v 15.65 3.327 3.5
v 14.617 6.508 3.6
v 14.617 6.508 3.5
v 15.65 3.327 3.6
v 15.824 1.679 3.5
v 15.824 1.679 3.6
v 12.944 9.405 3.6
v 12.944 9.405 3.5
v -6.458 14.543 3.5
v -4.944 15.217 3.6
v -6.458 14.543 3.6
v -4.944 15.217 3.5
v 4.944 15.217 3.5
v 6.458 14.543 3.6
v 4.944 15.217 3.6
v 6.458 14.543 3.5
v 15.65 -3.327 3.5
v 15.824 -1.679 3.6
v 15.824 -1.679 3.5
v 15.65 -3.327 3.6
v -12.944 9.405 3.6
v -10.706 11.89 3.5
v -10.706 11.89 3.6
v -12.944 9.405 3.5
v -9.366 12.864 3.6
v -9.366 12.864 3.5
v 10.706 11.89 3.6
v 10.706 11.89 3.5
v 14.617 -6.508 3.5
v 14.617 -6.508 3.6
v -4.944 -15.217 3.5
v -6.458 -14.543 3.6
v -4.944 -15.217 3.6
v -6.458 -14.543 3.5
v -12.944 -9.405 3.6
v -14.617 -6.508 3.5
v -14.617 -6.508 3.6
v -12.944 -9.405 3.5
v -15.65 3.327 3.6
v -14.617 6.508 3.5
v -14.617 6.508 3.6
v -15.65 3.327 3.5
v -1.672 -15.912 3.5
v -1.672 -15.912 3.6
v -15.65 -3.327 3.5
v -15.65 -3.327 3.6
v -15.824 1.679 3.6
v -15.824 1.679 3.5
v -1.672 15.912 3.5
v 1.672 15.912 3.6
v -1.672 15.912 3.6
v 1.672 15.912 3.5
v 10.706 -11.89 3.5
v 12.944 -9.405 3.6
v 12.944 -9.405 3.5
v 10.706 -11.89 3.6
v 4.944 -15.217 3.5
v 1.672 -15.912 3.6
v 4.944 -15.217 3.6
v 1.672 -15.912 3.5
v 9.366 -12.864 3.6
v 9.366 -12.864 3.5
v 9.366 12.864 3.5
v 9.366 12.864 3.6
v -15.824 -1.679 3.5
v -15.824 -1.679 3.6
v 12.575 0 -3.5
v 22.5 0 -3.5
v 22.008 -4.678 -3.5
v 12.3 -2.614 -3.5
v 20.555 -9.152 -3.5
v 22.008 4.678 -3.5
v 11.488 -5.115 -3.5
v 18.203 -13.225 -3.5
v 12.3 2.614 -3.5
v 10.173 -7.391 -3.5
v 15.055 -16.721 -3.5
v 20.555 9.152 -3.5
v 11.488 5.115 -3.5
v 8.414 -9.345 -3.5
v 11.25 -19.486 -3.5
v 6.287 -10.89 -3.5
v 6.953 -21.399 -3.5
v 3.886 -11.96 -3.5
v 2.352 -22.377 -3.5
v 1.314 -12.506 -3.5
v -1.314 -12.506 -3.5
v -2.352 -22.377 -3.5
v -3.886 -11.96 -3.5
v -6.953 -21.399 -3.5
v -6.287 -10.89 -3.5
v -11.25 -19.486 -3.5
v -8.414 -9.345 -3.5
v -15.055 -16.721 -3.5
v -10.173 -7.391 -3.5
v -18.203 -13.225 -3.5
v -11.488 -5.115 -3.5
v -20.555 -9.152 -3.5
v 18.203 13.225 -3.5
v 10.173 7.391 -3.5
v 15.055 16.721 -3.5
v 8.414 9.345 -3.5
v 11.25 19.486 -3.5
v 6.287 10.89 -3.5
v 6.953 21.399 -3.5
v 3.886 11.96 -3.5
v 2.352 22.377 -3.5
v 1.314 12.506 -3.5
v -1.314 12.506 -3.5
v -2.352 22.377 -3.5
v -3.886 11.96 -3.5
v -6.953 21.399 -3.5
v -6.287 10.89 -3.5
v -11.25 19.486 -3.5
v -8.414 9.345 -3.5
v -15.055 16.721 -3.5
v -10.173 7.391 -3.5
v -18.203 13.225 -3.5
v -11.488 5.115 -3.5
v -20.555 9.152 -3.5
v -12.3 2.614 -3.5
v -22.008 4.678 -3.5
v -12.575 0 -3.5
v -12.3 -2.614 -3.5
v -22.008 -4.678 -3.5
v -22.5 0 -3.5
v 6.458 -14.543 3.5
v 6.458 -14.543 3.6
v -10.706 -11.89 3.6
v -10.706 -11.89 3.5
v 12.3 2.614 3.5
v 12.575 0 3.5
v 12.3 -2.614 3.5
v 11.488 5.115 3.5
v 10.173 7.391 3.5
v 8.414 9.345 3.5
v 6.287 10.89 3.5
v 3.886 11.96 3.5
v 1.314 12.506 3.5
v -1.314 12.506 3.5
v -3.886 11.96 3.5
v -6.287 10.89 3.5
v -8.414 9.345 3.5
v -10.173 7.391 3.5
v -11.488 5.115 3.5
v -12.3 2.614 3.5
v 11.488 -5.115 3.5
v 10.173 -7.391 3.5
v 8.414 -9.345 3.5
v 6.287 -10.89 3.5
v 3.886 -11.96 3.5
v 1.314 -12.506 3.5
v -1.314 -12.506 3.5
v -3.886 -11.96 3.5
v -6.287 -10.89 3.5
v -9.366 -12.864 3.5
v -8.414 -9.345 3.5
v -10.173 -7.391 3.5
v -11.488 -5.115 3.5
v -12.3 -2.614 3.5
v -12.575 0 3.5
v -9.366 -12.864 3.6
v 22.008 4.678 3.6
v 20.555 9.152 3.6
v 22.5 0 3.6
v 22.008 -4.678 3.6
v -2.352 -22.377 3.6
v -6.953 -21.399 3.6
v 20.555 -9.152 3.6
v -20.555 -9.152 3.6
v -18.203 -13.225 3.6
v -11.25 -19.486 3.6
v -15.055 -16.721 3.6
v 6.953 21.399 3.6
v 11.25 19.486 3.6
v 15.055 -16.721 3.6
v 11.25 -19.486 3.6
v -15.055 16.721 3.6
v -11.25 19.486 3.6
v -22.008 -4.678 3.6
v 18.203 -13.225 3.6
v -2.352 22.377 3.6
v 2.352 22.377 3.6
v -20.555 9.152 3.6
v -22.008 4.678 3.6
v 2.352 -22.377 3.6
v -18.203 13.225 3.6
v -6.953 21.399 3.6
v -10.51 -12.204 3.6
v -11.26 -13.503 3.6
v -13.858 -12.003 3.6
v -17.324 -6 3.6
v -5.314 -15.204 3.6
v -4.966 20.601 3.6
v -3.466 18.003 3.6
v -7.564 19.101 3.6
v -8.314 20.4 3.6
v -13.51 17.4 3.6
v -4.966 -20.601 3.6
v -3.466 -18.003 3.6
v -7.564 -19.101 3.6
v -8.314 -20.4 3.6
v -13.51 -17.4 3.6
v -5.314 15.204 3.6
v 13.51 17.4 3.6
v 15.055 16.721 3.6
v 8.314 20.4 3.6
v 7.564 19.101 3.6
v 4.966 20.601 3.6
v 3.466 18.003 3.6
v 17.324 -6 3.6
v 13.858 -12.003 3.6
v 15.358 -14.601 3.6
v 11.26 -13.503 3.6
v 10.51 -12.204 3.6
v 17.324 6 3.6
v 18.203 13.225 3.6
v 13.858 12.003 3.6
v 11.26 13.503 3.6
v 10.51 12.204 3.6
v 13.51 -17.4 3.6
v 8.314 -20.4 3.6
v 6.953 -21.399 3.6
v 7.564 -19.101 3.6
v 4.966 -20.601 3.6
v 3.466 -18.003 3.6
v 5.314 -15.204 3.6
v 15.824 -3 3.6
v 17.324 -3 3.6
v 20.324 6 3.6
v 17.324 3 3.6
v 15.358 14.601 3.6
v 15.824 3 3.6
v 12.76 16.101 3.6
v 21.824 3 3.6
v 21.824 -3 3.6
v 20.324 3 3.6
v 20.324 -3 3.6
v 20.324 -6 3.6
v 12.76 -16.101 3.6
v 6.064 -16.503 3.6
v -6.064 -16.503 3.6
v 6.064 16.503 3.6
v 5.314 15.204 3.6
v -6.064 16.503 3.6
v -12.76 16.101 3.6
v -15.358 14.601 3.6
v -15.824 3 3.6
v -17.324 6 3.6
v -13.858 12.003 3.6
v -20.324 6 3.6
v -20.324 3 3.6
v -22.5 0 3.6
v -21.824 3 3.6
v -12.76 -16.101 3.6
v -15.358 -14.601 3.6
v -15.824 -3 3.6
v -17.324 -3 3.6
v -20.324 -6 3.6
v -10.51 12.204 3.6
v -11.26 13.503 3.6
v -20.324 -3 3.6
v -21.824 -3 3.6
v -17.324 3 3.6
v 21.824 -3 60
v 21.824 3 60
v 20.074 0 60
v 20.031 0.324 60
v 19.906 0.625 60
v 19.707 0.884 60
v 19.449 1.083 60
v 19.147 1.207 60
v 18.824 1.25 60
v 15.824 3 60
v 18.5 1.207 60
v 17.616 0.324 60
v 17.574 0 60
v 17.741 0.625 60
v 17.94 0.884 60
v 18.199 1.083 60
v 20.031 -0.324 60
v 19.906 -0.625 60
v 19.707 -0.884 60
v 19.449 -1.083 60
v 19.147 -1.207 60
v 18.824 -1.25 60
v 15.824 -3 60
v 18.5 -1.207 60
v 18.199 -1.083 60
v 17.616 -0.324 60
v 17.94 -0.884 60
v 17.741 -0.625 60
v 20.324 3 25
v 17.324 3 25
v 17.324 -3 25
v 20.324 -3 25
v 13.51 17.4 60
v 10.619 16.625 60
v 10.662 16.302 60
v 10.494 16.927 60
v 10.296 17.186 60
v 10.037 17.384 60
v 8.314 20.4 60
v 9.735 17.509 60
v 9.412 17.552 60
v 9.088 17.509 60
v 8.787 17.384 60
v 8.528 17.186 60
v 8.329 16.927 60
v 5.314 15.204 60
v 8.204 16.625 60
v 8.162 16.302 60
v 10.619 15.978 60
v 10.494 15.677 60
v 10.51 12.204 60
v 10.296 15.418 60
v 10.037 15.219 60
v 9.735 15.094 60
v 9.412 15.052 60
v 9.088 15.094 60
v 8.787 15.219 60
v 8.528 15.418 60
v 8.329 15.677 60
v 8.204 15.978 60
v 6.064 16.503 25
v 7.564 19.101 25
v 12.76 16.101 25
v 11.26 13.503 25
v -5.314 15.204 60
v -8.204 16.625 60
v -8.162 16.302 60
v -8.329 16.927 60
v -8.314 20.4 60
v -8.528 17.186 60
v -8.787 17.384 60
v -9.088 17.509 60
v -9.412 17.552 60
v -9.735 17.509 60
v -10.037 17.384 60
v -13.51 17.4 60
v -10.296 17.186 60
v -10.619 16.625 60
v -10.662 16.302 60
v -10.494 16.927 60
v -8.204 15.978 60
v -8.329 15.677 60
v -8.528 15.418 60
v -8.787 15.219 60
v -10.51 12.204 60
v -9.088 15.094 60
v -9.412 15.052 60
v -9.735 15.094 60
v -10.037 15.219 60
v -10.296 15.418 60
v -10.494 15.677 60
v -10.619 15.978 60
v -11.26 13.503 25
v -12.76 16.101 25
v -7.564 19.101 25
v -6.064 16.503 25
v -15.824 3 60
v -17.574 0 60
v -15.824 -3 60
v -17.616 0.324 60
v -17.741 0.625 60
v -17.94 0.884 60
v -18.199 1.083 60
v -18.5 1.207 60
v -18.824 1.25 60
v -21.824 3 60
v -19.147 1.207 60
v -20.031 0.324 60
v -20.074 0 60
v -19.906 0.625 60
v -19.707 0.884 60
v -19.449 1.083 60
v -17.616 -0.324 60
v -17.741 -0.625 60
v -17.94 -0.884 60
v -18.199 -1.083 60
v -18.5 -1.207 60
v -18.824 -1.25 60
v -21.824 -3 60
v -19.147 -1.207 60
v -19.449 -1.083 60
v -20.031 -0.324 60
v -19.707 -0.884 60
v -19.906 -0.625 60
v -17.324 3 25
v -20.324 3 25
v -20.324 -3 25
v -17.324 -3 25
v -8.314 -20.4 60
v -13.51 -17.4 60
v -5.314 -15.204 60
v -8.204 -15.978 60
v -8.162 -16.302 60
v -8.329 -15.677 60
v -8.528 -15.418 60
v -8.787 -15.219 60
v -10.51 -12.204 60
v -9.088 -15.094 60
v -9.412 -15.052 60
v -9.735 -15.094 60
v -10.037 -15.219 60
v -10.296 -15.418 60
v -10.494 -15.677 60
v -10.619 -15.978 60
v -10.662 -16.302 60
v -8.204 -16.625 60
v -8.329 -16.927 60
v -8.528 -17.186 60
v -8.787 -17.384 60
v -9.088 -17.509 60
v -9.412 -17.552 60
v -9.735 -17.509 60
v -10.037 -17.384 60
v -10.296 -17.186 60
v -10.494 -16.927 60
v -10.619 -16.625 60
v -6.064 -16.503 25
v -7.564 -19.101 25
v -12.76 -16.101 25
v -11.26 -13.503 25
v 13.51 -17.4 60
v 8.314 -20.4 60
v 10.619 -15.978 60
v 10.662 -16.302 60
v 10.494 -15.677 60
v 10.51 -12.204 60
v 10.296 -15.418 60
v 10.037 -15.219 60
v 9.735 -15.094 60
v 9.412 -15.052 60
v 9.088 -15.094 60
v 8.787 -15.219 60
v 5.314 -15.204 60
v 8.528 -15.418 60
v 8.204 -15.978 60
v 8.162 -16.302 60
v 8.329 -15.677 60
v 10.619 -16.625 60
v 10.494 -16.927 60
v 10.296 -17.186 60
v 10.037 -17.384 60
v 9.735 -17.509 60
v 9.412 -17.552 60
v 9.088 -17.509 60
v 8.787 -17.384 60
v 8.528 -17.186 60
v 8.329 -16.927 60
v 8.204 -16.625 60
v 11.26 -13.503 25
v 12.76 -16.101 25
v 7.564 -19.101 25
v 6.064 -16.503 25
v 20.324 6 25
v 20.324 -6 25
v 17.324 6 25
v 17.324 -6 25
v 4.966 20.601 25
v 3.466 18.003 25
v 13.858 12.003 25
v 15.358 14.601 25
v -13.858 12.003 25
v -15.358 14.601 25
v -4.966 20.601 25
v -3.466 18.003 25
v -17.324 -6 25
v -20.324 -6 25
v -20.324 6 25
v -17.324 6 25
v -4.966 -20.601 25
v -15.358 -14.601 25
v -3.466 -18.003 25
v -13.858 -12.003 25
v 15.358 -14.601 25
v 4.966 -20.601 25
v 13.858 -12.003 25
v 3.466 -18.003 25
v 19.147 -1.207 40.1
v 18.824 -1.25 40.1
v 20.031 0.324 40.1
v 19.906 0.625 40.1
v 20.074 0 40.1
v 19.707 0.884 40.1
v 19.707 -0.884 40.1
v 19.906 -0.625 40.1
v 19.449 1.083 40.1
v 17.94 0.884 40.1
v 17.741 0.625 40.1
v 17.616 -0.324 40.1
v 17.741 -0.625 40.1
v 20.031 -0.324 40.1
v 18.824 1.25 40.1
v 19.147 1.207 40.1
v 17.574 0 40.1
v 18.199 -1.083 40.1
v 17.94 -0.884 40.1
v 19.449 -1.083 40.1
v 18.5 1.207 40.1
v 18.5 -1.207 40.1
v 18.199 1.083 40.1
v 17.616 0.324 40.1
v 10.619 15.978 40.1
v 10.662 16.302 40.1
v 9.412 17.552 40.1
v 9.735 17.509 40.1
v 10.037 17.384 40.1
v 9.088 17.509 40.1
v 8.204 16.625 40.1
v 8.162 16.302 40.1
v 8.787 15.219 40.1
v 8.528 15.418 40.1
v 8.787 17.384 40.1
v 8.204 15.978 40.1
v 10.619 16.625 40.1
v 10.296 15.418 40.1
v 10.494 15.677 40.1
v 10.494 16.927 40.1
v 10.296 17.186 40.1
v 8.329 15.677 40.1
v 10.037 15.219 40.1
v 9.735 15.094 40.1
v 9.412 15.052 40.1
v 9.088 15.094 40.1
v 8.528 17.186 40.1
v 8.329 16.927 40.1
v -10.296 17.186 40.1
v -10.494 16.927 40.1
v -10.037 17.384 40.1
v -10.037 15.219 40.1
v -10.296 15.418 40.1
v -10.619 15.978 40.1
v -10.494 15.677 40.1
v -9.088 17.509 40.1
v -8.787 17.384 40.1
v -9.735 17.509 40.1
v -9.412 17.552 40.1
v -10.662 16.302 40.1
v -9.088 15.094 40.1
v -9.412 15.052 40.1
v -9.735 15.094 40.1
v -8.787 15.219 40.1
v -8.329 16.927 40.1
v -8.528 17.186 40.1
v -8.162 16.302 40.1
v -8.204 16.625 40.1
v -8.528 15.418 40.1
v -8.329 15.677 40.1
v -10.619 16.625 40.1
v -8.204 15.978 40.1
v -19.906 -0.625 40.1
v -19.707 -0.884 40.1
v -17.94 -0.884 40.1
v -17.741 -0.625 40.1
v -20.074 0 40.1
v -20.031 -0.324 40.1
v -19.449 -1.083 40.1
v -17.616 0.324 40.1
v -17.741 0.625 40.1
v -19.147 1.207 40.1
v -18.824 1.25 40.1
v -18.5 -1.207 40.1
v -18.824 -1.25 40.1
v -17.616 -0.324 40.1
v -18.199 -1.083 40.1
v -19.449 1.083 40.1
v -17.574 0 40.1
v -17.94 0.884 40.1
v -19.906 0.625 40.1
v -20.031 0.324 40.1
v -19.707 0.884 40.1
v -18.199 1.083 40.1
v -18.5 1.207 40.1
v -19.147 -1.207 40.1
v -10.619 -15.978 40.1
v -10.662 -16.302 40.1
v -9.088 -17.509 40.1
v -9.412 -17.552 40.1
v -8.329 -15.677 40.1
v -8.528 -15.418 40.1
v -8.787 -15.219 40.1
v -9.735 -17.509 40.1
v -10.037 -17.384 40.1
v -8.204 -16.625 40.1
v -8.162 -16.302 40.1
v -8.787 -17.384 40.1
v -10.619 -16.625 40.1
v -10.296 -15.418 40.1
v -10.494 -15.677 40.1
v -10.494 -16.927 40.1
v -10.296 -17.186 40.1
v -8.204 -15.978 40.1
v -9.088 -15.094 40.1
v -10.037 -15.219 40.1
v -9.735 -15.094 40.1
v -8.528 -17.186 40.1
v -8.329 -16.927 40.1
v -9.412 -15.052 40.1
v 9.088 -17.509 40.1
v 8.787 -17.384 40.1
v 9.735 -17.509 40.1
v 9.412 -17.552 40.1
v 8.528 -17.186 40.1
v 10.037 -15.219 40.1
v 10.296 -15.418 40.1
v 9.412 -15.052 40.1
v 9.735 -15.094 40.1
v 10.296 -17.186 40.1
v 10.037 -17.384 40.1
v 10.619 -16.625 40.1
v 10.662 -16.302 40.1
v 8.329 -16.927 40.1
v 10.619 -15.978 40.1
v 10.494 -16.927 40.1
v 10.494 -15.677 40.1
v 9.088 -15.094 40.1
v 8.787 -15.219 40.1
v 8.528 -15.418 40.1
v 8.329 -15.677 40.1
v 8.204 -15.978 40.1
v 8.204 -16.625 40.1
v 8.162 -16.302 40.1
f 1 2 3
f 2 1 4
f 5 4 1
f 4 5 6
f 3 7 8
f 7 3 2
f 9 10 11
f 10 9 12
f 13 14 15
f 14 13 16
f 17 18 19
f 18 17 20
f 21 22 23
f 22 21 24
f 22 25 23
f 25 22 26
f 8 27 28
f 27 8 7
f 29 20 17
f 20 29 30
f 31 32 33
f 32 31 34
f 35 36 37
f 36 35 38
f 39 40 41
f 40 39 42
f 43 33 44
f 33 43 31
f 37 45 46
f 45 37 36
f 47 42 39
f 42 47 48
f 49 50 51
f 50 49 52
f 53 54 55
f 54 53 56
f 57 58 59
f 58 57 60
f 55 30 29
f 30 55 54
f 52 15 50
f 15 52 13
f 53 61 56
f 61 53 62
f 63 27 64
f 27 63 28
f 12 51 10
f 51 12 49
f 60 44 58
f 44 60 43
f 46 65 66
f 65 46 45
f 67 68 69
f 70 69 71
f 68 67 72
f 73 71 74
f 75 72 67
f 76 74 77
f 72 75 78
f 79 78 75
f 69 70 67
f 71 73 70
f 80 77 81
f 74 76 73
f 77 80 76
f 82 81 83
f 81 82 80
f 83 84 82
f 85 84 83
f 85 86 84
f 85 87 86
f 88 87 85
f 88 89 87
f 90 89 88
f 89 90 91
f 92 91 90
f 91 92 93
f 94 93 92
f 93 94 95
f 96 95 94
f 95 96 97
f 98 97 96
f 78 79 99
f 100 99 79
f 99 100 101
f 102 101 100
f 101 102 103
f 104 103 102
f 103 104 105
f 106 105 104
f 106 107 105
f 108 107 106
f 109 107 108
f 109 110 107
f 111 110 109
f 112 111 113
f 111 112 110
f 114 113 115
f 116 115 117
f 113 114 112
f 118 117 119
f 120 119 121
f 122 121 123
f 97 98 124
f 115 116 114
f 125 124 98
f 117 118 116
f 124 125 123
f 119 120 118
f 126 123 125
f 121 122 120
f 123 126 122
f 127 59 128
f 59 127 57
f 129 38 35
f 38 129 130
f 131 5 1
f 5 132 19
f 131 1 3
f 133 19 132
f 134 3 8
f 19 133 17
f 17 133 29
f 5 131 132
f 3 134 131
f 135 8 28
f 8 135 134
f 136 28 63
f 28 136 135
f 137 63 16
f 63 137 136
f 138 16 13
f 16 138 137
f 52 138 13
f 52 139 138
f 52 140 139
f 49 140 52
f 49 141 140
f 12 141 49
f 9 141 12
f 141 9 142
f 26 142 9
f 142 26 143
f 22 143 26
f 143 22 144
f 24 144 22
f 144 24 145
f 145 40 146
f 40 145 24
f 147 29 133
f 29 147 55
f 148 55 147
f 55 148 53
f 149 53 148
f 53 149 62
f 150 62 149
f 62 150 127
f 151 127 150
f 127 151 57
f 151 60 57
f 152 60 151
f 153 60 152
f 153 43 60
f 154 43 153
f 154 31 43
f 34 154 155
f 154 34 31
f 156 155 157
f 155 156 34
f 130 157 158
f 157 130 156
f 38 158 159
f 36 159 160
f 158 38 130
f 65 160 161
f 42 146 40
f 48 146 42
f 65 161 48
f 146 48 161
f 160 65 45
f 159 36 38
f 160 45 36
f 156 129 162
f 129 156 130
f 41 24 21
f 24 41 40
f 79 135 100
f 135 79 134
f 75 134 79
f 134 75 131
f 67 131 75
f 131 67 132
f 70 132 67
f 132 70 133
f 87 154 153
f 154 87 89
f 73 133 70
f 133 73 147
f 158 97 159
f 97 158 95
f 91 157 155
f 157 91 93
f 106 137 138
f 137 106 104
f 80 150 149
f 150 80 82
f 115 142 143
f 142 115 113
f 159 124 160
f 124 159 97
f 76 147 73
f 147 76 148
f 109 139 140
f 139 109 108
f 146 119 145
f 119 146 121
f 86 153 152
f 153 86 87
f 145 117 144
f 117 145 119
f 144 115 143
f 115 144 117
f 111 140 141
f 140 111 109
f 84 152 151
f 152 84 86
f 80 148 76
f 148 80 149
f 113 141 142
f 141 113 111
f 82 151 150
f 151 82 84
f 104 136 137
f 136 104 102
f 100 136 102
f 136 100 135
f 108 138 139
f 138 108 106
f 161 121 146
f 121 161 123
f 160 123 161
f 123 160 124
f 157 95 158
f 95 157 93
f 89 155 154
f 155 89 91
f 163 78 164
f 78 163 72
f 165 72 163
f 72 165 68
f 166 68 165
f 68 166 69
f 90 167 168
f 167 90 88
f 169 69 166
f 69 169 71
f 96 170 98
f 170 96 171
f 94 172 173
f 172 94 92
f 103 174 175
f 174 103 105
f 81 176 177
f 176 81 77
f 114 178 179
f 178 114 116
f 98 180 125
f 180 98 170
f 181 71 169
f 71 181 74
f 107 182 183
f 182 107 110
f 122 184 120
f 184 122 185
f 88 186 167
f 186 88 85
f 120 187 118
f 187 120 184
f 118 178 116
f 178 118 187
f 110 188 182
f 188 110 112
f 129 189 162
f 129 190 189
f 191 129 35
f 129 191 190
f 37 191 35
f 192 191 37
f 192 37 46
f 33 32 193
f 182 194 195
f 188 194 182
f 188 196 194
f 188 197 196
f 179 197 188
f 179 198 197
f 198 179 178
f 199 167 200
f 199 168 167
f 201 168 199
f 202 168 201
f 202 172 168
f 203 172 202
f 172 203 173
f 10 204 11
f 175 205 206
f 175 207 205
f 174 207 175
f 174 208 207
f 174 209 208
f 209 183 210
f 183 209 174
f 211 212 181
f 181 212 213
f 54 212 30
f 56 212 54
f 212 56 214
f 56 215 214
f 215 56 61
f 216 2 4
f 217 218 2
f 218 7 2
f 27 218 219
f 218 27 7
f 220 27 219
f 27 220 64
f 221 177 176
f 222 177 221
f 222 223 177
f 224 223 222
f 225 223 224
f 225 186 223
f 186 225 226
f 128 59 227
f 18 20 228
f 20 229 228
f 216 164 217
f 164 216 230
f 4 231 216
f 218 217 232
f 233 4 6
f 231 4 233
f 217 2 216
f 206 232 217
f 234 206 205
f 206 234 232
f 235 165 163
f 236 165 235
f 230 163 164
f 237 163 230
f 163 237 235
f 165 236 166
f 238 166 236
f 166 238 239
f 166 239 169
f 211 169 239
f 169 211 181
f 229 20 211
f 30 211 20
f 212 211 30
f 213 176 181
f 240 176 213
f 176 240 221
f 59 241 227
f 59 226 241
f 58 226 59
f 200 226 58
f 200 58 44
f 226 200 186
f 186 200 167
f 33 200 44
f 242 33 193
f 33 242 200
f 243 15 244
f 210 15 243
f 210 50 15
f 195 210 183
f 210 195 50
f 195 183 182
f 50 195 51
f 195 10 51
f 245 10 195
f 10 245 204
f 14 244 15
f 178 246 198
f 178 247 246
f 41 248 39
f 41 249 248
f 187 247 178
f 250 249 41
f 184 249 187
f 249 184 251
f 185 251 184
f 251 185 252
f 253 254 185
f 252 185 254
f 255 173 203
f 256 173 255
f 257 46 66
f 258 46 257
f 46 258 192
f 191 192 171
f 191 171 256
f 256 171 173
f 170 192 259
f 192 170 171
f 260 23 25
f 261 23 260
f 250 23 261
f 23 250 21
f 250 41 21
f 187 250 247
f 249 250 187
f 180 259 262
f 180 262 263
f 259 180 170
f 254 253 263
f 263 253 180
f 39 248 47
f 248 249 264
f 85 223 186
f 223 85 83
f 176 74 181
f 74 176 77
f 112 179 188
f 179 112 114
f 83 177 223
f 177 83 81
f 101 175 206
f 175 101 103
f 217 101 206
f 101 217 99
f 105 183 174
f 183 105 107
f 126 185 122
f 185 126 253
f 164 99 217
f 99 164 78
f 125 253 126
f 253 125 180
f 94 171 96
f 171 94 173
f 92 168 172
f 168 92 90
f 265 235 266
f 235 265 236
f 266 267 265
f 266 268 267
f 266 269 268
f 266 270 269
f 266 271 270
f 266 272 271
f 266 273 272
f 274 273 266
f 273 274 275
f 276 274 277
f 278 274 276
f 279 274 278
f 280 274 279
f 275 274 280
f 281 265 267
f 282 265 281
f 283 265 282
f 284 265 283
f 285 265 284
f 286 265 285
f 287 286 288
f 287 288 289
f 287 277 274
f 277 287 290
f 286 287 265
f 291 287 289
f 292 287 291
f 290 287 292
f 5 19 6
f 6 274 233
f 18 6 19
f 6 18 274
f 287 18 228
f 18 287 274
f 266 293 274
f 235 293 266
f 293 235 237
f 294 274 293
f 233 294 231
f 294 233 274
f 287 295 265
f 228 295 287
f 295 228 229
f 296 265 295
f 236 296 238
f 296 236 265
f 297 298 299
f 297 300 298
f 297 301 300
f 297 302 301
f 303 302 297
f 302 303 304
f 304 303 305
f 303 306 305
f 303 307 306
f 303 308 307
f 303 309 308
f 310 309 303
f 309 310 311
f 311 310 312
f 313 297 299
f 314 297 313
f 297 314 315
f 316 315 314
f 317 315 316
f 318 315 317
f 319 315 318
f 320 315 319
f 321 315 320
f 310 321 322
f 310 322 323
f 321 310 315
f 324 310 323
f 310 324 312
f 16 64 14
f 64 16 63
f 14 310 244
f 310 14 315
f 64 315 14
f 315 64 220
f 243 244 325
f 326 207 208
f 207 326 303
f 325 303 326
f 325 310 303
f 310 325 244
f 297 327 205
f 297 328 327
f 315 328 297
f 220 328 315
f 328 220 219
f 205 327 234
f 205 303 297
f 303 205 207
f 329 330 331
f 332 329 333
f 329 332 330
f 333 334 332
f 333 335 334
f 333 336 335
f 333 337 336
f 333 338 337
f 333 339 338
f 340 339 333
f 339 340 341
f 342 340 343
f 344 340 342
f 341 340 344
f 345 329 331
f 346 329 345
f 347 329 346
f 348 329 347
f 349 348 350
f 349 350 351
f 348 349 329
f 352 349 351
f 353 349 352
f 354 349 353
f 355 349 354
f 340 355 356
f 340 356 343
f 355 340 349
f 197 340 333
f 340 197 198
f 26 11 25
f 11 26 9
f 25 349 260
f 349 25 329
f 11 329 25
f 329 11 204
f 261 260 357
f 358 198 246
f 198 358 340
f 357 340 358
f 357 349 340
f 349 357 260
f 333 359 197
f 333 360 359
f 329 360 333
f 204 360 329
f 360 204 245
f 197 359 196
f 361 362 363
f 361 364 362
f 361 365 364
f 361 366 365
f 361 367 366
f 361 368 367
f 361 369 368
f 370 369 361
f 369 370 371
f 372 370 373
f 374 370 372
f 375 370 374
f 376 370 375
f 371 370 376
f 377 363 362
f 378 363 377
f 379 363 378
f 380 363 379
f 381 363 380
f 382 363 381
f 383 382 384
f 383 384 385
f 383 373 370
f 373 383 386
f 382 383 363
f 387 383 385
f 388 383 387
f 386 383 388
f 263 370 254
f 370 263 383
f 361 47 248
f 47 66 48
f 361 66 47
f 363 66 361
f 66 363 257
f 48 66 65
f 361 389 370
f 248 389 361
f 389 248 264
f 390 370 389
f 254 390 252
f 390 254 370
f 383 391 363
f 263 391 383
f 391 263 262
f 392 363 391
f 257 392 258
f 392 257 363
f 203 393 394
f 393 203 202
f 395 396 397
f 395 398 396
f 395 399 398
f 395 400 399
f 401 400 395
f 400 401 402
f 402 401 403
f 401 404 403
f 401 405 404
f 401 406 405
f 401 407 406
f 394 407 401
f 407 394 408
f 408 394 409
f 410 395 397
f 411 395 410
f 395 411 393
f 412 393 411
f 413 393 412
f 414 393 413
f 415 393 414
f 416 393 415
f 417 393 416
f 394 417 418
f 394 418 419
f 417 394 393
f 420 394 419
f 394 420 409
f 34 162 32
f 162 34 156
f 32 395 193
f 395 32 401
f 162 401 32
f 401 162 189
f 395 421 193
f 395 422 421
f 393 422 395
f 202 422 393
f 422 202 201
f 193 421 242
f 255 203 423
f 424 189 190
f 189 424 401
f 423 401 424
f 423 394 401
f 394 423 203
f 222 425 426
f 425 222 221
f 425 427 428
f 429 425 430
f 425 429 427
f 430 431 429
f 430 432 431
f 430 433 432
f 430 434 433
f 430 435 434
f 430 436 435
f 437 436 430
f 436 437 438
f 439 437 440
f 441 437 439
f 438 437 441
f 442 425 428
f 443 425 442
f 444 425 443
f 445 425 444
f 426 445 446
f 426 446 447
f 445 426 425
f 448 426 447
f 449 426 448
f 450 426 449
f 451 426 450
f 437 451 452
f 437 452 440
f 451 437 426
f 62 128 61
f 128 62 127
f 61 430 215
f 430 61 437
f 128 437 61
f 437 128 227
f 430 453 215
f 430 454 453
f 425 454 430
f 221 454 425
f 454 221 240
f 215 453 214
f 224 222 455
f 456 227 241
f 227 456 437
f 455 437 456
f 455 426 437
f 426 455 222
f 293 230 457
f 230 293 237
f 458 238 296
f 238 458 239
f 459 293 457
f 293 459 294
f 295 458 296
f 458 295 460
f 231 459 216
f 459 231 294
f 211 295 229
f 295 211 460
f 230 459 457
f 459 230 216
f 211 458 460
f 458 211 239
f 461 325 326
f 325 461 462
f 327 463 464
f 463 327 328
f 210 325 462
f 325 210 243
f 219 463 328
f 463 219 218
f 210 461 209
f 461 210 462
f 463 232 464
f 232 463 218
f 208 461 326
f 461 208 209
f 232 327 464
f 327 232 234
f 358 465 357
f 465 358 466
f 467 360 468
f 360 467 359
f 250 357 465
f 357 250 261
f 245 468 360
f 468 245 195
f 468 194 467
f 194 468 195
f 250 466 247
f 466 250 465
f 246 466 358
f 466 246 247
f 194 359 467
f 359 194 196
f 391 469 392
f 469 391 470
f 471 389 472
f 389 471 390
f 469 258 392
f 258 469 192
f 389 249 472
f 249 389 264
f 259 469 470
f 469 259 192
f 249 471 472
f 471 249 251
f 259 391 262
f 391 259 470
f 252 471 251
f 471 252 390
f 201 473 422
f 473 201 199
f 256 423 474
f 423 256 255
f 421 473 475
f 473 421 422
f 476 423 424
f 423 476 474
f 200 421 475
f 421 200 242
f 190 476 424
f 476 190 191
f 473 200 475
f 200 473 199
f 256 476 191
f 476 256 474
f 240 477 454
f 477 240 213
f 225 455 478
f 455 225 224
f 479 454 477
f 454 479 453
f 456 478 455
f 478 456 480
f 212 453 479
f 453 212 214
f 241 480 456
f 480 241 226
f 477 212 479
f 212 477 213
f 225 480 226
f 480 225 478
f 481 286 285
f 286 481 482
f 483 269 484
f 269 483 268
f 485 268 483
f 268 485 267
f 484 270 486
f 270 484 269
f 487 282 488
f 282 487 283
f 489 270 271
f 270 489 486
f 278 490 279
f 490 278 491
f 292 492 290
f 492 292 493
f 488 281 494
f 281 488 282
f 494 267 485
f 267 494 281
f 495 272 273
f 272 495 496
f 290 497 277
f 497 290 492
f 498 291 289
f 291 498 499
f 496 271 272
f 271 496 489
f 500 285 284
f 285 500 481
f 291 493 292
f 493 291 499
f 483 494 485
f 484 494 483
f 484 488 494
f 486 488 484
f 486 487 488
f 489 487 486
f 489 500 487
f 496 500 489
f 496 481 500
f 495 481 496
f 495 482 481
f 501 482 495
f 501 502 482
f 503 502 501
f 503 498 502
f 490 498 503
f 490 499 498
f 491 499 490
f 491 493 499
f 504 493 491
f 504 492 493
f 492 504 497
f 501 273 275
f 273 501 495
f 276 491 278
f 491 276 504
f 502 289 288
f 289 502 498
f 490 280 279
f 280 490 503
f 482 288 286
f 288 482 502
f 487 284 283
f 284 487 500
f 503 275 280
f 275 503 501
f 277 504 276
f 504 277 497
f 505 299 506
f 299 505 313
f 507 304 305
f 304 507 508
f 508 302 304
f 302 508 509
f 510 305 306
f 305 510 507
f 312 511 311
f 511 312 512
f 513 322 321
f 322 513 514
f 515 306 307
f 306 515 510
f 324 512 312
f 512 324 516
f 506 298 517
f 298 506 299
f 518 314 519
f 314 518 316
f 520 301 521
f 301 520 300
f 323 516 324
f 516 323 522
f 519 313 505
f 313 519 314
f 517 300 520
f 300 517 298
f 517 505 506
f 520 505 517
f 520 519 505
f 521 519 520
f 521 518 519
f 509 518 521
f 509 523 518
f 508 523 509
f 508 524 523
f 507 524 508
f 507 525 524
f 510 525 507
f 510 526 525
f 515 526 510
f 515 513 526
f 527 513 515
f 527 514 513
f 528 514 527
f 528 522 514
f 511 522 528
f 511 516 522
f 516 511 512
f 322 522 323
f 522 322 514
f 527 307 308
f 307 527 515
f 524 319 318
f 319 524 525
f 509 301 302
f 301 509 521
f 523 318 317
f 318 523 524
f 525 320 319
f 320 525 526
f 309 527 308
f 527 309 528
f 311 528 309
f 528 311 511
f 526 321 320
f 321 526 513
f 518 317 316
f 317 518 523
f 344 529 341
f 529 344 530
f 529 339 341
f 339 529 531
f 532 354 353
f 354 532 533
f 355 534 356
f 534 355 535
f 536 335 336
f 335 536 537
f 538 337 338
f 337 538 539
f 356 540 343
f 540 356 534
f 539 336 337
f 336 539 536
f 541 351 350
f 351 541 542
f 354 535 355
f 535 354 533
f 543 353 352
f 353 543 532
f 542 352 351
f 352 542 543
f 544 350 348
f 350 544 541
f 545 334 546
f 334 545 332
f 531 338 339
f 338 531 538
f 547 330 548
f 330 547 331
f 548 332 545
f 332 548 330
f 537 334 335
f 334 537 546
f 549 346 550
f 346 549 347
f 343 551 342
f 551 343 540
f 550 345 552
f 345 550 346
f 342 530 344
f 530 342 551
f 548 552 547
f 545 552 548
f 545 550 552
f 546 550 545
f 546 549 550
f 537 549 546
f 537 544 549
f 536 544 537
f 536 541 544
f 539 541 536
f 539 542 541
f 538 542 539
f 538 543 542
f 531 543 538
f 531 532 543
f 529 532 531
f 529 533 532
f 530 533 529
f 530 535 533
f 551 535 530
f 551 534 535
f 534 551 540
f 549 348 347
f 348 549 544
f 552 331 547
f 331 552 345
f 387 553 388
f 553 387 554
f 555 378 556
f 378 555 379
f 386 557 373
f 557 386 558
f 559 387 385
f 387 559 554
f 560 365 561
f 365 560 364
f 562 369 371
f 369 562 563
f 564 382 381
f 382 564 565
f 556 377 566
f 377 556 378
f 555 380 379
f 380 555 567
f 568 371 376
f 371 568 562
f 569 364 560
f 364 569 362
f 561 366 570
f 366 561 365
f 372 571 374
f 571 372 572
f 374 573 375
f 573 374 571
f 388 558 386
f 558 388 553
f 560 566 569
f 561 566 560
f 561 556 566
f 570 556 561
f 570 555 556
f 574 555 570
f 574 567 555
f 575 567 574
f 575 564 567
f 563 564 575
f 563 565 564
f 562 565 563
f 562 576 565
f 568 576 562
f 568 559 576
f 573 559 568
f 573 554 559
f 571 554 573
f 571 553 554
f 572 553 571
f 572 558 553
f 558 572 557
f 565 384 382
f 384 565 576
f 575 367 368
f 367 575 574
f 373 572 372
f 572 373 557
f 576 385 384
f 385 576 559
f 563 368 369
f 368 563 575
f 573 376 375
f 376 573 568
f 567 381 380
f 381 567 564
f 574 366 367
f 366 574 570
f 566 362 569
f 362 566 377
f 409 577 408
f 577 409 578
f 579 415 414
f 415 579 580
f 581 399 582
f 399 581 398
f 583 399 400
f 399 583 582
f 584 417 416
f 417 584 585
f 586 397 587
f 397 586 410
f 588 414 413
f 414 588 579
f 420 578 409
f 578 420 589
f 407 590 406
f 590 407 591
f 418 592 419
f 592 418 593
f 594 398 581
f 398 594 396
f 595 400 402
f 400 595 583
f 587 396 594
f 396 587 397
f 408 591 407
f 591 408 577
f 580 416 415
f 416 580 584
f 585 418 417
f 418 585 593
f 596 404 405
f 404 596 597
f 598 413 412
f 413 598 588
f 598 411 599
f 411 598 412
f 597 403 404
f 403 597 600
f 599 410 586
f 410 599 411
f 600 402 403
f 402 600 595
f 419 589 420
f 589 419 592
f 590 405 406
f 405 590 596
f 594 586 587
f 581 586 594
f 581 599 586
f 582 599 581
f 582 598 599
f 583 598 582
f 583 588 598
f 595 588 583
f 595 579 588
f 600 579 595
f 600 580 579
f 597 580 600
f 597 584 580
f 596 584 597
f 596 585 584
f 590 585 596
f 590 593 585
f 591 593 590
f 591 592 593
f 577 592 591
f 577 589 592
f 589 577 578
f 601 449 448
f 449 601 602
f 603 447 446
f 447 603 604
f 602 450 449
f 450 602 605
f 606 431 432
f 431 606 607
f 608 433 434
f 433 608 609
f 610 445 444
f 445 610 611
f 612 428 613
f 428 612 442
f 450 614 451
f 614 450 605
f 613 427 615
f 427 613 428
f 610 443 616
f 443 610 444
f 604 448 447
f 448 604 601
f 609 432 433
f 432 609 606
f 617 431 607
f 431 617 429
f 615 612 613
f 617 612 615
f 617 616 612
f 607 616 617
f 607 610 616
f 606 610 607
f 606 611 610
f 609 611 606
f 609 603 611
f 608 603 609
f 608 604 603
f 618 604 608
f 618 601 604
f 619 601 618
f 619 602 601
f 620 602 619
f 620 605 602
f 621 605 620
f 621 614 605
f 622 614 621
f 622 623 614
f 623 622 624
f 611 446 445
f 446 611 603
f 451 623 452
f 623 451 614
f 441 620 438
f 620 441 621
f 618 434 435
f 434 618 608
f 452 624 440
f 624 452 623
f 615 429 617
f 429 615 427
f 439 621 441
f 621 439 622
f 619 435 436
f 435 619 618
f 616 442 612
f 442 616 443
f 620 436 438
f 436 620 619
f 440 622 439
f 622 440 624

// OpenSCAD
// file: 3dprinter.scad
//BioDeploy SCAD file = 3dprinter.scad


//choose the max specs for your 3d printer
//here we use a replicator2x specs

x_print_max = 25*10;
y_print_max = 15.2*10;
z_print_max = 15.5*10;

//don't forget *10 to put in centimeters
// file: generator_variables.scad
//===============================================//
//===============================================//
// BioDeploy SCAD file = generator_variables.scad//
//                 Start File                    //
//===============================================//
//===============================================//
//-----------------------------------------------//
include <3dprinter.scad>
//===============================================//
//                   variables                   //
//===============================================//
//===============================================//
pad = 0.1; //padding
//choose the spec for your generator
//===============================================//
//                    magnets1                   //
//===============================================//
//Volume :
x_magnet = 5.5;
y_magnet = 21.5;
z_magnet = 21.5;
//Number of magnets on the rotor :
nbmagnetsonrotor = 16;
rotor_ext_max = 60;
//===============================================//
//                    magnets2                   //
//===============================================//
//Volume :
diam_magnet2 = 35;
z_magnet2 = 5;
//Number of magnets on the rotor :
nbmagnetsonrotor2 = 6;
//===============================================//
//                      rotor                    //
//===============================================//
smooth_rotor = 100;
smooth_bobine = 100;
z_rotor_int = 20;
//===============================================//
//                  adapter_rotor                //
//===============================================//
diam_adapter_max = 32 ;
diam_adapter_min = 25.15 ;
h_adapter = 7;
h_adapter_box = 12;
nbarm = 6;
//===============================================//
//                    Bobine1                    //
//===============================================//
r_bobine_ext_max = y_magnet/2;
r_bobine_ext_min = 4.5;
r_bobine_int = 3.5;

x_bobine = 30;
p_bobine_ext = 1;

r_bobine2_ext_min = 3.4;
r_bobine2_int = 2.5;

wire_in = 1;
wire_out = 1;


//===============================================//
//                    Protector                  //
//===============================================//

r_bobine_protector_ext_max = y_magnet/2 + 1.5;
gap_bobine_protector = (r_bobine_protector_ext_max - r_bobine_ext_max)/2;


x_bobine_protector=x_bobine+1.5;

smooth_protector = 100;

//===============================================//
//                    Socle1                     //
//===============================================//

r_socle_int = 0;
r_socle_ext = 0;
position_bobine_in = 0;
position_bobine_out = 0;
connector_socle_female =0;
connector_socle_male =0;
space_marge=3;

//-----------------------------------------------//
//===============================================//
//===============================================//
// BioDeploy SCAD file = generator_variables.scad//
//                   End  File                   //
//===============================================//
//===============================================//
// main file
//===============================================//
//===============================================//
//BioDeploy SCAD file = generator_rotor_adapter_hdd.scad//
//                 Start File                    //
//===============================================//
//===============================================//
//-----------------------------------------------//

//===============================================//
//                   variables                   //
//===============================================//
include <generator_variables.scad>
//===============================================//
//               Calls for use                   //
//===============================================//
//use <generator_logo.scad>
//===============================================//
//                    Trees                      //
//===============================================//

module arm() {
cube([6,6,60], center=true);
}


module arm_rotation_adapter() {
translate([diam_adapter_max/1.7,0,30])arm();}


module arm_rotation(){
for(i = [0:(nbarm-1)]) {
rotate([0,0,(60)*i])arm_rotation_adapter();
}}

//
module armbase() {
cube([3,12,25], center=true);
}


module armbase_rotation_adapter() {
translate([diam_adapter_max/1.7,0,12.5])armbase();}


module armbase_rotation(){
for(i = [0:(nbarm-1)]) {
rotate([0,0,(60)*i])armbase_rotation_adapter();
}}
//

module centralringattach() {
difference()
{
color("Blue",1)translate([0,0,0])cylinder(h_adapter,diam_adapter_max/2,diam_adapter_max/2,center=true);
translate([0,0,0])cylinder(h_adapter+pad,diam_adapter_min/2,diam_adapter_min/2,center=true);}
}


module centralringattachext() {
difference()
{
color("Red",1)translate([0,0,+pad/2])cylinder(h_adapter+pad,45/2,45/2,center=true);
translate([0,0,+pad/2])cylinder(h_adapter+pad*2,diam_adapter_max/2,diam_adapter_max/2,center=true);}
}
module generator_rotor_adapter_hdd_a() {
union() {
centralringattach();
centralringattachext();
arm_rotation();
armbase_rotation();

}
}






module armscrewdif() {

cylinder(20,1.25,1.25,$fn=24,center=true);
}


module armscrewdif_rotation_adapter() {
translate([diam_adapter_max/1.7,0,50+pad])armscrewdif();}


module armscrewdif_rotation(){
for(i = [0:(nbarm-1)]) {
rotate([0,0,(60)*i])armscrewdif_rotation_adapter();
}}

module generator_rotor_adapter_hdd() {
difference() {
generator_rotor_adapter_hdd_a();
armscrewdif_rotation();}}


generator_rotor_adapter_hdd();

//-----------------------------------------------//
//===============================================//
//===============================================//
//BioDeploy SCAD file = generator_rotor_adapter_hdd.scad//
//                   End  File                   //
//===============================================//
//===============================================//
